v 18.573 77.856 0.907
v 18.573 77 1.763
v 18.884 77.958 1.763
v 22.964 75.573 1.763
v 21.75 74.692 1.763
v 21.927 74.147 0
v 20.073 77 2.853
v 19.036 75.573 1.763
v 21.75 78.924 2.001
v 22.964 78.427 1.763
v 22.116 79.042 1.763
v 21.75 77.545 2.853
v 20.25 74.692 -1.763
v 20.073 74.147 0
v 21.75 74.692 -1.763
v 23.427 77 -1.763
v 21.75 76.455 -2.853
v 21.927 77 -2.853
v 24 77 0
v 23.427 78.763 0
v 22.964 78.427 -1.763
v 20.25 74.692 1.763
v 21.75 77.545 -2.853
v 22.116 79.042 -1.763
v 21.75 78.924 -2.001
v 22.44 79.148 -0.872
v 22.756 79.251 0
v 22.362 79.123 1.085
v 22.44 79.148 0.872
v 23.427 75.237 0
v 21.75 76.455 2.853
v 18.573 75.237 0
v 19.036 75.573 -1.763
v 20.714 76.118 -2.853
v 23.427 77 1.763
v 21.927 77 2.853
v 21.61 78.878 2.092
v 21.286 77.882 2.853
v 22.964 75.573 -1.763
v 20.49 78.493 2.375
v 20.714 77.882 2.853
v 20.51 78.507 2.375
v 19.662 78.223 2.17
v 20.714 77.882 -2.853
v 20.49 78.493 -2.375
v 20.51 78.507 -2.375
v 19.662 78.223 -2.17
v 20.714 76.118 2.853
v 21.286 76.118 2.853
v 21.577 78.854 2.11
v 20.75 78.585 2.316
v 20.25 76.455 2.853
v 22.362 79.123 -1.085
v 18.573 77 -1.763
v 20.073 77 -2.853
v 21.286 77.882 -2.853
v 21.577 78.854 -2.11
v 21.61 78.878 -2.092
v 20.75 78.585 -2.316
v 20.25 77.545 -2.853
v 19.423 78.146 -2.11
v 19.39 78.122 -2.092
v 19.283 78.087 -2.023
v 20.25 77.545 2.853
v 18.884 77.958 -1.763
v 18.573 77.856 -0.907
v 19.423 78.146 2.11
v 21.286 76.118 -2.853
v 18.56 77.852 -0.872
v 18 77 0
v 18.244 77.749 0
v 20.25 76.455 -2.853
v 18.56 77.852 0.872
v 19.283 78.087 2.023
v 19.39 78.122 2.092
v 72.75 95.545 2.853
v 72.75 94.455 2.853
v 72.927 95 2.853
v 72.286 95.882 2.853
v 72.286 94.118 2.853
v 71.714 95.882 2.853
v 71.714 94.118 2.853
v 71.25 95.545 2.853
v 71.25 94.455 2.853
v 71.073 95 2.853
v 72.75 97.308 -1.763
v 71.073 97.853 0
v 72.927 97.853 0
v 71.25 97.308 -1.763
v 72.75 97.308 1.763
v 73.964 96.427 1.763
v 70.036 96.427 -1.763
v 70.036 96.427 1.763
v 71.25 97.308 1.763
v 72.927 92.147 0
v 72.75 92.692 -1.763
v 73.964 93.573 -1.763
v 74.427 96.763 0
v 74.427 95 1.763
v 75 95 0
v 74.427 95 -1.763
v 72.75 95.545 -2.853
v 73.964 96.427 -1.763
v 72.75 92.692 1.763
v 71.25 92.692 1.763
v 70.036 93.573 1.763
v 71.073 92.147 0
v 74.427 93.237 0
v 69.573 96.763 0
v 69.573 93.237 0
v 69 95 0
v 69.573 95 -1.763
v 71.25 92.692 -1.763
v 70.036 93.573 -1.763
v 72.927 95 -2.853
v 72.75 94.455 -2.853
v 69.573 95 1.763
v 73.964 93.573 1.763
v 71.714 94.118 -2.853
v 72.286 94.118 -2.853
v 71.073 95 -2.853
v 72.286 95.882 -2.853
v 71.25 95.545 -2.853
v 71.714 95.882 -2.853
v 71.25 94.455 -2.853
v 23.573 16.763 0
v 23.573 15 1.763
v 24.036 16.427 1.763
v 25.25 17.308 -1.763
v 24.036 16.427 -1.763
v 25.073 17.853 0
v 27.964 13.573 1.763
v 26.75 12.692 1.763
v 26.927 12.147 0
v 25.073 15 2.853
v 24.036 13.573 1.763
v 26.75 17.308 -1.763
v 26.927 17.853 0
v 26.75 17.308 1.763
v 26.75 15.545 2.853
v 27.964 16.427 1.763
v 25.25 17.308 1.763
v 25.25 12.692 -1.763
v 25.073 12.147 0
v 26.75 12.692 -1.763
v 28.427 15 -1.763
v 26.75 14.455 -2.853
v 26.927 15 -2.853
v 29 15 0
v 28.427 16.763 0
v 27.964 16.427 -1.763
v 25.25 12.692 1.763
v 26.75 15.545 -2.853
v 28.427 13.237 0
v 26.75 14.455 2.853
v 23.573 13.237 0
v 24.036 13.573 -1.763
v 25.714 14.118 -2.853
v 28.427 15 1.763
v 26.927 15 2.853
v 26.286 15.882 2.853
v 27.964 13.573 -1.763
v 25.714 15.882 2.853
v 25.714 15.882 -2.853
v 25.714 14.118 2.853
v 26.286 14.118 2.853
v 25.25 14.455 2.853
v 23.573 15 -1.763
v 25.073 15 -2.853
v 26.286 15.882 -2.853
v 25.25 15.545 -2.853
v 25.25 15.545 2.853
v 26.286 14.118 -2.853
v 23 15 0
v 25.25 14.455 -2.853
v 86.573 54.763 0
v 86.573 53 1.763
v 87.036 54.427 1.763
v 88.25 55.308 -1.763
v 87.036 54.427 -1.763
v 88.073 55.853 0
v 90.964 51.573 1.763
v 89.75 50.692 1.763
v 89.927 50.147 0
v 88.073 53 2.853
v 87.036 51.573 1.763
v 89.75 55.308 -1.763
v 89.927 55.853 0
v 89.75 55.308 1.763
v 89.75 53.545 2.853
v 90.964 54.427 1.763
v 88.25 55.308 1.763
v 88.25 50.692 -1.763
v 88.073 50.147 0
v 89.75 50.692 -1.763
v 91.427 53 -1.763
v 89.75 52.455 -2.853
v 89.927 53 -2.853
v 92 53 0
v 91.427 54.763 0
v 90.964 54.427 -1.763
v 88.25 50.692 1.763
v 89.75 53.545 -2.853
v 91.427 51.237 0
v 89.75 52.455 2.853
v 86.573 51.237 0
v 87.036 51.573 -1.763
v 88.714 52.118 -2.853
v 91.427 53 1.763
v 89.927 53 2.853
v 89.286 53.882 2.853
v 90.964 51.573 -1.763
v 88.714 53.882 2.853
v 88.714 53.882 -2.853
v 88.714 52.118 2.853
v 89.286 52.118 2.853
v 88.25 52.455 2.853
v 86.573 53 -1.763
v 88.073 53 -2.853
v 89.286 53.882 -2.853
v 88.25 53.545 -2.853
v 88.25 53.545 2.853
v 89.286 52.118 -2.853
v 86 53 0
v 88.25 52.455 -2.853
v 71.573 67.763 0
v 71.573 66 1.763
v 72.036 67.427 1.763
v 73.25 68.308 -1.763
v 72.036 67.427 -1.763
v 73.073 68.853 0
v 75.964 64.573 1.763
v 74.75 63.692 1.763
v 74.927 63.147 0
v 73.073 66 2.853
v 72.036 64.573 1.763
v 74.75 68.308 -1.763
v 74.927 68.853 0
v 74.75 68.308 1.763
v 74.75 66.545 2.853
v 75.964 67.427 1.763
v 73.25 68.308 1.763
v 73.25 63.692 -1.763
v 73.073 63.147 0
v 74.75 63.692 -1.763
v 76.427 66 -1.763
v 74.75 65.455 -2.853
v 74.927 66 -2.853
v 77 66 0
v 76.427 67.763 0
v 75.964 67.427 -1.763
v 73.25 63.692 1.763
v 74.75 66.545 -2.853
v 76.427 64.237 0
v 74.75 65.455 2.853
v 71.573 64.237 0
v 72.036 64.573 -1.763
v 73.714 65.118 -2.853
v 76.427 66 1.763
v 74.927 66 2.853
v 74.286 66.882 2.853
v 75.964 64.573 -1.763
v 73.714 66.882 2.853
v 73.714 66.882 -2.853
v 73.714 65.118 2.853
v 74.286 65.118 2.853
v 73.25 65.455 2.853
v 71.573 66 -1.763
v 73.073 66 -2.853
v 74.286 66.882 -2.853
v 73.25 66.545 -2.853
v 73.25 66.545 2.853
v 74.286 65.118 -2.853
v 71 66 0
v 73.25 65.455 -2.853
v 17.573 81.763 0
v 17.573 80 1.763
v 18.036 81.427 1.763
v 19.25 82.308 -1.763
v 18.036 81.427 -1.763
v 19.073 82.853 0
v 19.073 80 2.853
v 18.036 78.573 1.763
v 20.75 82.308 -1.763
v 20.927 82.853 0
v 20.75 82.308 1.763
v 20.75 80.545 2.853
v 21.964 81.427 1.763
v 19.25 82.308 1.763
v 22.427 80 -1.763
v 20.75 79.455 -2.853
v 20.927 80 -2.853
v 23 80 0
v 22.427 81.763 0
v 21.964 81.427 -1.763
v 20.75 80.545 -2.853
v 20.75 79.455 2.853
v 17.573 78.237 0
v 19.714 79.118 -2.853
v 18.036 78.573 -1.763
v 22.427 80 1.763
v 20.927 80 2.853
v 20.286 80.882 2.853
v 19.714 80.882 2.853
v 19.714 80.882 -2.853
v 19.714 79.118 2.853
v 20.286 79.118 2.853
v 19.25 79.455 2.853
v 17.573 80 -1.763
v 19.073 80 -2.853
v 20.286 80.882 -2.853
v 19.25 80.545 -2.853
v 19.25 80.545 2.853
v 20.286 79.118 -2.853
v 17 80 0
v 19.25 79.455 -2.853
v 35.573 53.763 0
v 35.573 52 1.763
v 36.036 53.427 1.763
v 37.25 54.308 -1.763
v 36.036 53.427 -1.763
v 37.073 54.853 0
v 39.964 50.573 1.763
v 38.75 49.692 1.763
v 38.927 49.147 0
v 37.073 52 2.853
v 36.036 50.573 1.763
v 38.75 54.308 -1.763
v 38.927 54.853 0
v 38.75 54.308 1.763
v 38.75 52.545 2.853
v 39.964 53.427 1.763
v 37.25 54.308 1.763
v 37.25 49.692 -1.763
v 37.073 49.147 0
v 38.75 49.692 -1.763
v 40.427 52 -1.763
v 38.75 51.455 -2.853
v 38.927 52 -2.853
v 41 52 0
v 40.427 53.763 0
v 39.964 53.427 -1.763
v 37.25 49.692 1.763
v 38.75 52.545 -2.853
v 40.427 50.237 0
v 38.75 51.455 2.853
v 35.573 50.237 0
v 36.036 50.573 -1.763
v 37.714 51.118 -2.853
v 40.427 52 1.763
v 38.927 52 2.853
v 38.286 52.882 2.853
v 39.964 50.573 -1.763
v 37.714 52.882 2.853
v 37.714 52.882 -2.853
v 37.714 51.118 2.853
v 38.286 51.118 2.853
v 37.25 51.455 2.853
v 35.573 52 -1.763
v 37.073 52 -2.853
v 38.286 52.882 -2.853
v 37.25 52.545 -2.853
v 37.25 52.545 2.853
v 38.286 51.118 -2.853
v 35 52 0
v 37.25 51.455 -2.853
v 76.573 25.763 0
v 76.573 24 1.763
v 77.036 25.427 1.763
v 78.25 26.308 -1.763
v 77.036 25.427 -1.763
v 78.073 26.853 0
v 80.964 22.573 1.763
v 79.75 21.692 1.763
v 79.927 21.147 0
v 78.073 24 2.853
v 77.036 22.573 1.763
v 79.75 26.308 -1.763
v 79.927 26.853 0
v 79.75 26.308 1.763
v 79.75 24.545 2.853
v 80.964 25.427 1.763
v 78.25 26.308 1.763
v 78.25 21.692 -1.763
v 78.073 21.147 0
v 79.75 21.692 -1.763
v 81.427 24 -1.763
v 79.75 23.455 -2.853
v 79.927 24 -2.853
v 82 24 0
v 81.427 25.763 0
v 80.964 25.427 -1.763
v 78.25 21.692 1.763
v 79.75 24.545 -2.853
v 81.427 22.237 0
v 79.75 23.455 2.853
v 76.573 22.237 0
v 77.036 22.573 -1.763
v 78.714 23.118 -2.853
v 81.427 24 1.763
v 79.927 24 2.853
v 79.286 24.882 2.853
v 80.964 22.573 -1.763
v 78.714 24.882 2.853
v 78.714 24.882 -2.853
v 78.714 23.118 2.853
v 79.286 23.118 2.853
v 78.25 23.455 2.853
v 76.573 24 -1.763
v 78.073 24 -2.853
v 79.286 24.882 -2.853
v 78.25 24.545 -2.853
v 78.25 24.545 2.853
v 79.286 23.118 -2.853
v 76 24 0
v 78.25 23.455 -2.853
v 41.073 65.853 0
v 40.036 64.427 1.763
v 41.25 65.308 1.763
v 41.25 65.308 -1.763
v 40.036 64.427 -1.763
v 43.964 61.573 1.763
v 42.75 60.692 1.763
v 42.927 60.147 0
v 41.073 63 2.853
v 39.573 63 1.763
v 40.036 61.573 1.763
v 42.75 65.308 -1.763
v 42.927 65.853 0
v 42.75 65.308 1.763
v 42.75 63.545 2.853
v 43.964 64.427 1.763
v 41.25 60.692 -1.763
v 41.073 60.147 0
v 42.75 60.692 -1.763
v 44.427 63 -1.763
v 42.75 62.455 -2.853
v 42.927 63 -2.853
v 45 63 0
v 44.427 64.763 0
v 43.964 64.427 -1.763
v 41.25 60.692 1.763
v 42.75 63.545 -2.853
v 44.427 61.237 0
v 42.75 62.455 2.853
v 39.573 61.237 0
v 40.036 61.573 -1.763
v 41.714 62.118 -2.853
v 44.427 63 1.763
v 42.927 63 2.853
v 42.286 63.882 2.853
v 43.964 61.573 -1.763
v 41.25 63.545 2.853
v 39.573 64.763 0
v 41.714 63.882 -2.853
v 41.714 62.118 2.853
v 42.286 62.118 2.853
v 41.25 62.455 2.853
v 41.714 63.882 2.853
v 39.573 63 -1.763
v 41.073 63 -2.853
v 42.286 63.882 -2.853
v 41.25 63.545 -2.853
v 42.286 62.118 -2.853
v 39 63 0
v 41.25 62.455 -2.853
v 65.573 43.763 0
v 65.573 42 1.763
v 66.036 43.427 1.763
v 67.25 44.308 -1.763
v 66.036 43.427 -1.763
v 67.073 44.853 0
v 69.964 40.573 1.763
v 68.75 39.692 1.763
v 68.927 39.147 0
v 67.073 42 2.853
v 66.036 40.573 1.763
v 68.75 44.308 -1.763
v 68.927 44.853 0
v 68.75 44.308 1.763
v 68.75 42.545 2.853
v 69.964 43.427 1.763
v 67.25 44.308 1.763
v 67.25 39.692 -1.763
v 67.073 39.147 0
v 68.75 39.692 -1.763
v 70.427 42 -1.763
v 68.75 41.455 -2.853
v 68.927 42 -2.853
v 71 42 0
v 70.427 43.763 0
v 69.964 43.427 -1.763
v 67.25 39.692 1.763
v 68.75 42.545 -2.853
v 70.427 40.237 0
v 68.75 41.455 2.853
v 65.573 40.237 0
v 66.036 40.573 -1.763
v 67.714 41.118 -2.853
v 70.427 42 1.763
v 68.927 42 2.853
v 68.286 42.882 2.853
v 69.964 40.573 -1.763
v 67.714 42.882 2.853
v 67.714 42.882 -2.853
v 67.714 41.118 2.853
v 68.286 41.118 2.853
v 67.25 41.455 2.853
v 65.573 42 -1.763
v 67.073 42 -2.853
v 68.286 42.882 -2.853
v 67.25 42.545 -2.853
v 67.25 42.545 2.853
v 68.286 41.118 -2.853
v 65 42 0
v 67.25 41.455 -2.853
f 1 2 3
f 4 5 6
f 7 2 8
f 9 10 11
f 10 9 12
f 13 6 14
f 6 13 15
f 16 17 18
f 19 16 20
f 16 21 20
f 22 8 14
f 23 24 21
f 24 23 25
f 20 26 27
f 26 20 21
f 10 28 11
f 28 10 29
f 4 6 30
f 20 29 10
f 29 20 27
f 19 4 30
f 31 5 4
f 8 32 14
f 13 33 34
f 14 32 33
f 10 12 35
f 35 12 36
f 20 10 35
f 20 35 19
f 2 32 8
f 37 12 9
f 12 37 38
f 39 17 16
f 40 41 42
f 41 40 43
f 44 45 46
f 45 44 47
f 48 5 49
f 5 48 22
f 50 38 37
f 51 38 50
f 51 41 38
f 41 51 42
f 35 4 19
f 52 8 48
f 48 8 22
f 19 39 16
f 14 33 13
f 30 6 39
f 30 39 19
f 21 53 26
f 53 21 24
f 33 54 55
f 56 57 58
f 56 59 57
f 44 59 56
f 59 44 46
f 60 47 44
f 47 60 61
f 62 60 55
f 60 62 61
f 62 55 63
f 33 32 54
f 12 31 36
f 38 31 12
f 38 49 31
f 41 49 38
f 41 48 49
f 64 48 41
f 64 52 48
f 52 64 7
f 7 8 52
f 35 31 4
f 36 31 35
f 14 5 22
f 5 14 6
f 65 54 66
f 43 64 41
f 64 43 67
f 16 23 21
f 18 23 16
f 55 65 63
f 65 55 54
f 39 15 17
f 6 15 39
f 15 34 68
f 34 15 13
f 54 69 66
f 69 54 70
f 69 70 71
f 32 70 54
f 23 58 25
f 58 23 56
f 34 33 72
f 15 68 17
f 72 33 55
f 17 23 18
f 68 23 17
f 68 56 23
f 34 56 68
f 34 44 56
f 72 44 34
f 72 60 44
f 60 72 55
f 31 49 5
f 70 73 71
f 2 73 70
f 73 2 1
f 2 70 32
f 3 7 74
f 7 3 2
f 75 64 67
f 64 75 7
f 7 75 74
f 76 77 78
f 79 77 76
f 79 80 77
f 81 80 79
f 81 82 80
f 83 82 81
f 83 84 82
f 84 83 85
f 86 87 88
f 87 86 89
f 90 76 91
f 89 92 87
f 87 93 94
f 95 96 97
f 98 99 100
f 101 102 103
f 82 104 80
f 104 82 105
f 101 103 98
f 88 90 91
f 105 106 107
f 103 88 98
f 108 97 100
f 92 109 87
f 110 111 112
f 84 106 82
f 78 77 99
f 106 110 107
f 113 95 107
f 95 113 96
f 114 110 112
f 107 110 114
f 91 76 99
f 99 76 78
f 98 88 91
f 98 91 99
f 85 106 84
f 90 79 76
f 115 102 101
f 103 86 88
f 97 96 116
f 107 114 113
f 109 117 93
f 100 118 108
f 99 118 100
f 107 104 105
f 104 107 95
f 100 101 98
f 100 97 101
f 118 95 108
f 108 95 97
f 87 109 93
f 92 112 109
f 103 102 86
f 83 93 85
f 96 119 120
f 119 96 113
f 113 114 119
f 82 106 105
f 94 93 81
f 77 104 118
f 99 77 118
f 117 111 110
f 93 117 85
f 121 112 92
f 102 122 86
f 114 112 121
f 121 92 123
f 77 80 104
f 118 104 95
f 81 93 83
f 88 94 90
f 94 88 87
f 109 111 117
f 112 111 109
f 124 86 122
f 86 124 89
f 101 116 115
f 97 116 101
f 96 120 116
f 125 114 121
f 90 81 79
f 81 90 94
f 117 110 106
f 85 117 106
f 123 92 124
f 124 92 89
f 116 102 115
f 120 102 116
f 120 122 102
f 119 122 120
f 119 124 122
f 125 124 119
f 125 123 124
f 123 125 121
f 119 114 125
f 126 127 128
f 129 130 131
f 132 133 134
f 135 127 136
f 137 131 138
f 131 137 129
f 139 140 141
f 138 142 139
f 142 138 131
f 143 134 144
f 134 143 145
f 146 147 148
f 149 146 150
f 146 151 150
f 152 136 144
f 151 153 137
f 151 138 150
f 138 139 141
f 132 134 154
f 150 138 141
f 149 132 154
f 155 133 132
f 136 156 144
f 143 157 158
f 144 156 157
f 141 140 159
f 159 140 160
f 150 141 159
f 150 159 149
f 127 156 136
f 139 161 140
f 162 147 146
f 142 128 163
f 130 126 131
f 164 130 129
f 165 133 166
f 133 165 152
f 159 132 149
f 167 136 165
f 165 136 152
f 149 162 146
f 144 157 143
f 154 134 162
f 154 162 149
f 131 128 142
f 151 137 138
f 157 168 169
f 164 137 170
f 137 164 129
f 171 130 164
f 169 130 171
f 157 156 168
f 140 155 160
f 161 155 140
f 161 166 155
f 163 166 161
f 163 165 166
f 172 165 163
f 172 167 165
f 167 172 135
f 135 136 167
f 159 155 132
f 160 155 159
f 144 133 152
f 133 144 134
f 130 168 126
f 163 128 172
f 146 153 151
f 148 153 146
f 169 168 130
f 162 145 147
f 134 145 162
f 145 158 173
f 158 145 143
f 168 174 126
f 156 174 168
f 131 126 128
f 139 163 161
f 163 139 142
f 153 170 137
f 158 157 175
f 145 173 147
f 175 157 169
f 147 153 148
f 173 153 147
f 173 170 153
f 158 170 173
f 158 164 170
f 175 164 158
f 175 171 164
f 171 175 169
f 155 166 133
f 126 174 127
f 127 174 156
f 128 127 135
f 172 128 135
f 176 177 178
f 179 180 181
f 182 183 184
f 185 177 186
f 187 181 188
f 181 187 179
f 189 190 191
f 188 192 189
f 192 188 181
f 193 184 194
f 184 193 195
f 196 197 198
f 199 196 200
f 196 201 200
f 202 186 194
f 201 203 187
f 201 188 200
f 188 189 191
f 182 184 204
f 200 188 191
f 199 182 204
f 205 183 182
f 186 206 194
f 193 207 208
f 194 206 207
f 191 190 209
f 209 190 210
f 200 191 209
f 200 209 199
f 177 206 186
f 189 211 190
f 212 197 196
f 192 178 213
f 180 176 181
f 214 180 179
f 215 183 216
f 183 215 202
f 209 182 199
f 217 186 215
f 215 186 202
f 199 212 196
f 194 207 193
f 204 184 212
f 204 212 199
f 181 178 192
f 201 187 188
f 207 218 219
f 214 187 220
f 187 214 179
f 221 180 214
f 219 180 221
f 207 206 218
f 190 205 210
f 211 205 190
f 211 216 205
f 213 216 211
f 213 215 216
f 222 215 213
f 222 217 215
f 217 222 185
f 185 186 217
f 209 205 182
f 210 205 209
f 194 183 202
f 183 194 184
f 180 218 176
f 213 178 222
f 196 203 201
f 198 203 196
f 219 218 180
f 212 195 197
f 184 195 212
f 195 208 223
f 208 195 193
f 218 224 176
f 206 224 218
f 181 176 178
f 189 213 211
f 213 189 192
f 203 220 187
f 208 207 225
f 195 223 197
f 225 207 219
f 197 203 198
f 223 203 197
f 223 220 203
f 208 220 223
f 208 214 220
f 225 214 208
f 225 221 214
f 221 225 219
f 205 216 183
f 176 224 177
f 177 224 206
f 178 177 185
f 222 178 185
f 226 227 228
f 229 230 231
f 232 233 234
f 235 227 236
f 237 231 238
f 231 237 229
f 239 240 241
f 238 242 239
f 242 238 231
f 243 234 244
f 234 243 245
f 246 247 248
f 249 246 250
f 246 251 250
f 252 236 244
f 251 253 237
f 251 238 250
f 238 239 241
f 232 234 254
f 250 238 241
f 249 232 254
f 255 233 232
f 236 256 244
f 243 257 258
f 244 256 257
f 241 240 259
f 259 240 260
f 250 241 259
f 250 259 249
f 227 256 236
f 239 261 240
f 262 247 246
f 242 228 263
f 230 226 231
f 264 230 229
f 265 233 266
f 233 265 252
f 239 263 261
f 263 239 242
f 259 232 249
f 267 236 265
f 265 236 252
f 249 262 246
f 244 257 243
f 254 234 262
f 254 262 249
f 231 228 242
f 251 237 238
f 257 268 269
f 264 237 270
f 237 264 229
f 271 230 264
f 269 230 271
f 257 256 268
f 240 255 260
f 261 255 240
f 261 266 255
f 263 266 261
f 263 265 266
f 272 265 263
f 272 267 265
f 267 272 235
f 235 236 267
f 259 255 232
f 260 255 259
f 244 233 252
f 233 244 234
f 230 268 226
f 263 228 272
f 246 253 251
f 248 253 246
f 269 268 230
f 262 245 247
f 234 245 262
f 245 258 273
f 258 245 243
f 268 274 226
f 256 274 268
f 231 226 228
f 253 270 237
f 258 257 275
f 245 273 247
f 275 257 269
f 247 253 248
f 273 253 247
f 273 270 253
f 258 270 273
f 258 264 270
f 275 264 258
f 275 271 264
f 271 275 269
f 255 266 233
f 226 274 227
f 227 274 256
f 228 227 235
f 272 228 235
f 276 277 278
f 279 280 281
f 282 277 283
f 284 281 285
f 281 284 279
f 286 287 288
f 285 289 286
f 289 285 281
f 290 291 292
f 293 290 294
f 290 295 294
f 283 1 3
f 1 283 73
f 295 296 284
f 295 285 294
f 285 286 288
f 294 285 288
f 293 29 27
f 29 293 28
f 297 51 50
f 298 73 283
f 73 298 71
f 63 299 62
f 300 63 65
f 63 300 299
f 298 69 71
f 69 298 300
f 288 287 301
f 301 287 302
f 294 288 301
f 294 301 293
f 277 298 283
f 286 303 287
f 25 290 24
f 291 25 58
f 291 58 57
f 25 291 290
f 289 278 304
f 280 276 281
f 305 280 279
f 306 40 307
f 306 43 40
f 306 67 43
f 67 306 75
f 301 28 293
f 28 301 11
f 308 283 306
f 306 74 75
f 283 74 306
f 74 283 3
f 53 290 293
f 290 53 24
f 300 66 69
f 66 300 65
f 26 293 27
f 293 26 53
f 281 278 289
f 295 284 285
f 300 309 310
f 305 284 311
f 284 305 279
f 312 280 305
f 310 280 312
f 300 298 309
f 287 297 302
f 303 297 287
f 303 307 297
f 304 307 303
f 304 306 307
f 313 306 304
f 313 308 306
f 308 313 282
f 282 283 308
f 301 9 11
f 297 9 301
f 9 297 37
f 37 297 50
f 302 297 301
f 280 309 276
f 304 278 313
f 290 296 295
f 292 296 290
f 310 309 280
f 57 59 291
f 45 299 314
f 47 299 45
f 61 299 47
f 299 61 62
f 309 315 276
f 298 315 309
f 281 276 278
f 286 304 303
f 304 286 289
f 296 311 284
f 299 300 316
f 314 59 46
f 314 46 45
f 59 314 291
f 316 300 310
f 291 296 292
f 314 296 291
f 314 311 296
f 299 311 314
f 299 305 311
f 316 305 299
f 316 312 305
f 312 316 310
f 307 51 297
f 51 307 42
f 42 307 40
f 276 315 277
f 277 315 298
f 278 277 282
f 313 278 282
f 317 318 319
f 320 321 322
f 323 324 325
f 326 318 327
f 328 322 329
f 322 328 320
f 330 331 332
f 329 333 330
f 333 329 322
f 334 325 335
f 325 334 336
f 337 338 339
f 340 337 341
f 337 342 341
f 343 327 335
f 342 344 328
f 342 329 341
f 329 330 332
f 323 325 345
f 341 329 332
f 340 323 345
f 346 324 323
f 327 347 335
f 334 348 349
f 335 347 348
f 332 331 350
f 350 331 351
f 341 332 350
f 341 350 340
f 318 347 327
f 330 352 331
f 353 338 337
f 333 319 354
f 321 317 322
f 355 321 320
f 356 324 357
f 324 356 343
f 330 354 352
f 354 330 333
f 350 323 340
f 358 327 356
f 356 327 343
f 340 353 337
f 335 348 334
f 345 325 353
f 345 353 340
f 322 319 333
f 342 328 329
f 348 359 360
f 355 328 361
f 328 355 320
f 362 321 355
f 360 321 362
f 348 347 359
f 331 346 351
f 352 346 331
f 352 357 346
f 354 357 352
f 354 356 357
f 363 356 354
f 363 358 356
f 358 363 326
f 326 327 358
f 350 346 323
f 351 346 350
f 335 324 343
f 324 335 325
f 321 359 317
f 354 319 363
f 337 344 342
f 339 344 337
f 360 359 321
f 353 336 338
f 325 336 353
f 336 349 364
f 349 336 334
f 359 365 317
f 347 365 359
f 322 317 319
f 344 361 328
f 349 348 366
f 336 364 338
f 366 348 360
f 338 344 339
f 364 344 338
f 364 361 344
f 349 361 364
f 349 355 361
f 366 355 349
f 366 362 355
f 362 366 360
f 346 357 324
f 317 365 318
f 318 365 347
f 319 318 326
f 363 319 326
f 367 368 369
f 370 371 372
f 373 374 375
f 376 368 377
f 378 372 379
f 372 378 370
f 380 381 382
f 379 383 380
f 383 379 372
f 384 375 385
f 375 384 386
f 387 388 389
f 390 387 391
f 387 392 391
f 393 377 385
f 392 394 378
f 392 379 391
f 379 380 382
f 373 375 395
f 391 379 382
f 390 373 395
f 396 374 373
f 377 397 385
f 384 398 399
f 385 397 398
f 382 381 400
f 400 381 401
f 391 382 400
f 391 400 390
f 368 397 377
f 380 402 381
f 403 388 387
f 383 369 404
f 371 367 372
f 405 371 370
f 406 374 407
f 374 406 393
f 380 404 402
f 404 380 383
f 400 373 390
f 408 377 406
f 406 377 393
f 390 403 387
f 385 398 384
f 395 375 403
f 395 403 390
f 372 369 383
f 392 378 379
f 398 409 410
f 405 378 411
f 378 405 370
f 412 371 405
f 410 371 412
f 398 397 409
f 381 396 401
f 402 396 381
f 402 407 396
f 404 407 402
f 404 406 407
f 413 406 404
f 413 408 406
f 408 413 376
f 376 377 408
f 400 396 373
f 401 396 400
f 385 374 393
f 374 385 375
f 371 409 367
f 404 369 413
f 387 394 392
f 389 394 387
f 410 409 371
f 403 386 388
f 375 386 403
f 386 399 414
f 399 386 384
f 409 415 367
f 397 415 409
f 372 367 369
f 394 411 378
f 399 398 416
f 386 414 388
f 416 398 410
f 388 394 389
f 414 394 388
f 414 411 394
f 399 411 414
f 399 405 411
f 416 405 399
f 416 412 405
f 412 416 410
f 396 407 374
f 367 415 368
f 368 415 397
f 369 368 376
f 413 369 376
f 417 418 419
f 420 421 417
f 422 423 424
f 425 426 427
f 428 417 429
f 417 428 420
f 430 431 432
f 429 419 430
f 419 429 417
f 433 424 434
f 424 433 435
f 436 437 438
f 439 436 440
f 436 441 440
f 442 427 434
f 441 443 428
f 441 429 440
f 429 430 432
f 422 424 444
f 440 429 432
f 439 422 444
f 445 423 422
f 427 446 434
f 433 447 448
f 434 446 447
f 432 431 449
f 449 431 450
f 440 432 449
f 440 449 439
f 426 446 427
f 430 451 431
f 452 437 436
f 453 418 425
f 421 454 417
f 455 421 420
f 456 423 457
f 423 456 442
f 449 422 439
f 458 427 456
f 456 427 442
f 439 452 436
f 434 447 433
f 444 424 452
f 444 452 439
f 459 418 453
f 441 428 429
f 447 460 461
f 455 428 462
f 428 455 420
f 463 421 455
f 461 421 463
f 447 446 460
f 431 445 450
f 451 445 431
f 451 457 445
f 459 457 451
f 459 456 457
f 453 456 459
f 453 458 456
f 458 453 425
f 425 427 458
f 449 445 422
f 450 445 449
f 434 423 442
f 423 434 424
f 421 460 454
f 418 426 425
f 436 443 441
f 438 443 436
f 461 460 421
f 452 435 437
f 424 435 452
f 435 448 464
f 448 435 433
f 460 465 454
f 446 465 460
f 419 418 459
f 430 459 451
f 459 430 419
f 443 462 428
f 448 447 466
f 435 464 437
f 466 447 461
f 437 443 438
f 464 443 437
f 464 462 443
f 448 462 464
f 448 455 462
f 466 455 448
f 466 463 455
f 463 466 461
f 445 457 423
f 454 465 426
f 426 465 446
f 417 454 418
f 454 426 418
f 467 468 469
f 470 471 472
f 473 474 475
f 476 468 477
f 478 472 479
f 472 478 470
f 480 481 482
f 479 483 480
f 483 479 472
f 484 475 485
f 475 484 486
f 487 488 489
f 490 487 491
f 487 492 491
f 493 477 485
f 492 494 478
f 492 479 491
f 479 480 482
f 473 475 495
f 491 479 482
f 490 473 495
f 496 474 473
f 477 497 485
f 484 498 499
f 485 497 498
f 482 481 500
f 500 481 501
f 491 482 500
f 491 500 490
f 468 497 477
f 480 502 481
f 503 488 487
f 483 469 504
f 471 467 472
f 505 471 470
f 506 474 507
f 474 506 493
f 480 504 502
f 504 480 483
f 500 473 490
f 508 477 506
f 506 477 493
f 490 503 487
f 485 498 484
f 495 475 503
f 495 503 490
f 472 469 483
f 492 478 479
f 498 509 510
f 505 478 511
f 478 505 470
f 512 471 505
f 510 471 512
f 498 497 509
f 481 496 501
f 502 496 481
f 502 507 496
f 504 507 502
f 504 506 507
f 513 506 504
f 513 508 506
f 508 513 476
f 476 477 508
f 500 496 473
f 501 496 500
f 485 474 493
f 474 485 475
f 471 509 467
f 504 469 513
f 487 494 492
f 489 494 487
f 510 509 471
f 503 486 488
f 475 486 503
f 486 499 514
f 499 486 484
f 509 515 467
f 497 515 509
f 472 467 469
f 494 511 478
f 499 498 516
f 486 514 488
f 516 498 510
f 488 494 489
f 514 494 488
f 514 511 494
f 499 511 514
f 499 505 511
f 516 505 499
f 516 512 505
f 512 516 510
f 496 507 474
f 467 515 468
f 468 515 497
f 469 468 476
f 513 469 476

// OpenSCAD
//random points---------------------------------
function rnd_v(init_value,end_value)=round(rands(init_value,end_value,1)[0]);

init_value=0;
end_value=100;
points_num=10;

points=[
for(i=[0:points_num-1]
    )
    [rnd_v(init_value,end_value),
     rnd_v(init_value,end_value)
    ]];
for(i=points)
    translate(i)
        sphere(3);
//----------------------------------------------
